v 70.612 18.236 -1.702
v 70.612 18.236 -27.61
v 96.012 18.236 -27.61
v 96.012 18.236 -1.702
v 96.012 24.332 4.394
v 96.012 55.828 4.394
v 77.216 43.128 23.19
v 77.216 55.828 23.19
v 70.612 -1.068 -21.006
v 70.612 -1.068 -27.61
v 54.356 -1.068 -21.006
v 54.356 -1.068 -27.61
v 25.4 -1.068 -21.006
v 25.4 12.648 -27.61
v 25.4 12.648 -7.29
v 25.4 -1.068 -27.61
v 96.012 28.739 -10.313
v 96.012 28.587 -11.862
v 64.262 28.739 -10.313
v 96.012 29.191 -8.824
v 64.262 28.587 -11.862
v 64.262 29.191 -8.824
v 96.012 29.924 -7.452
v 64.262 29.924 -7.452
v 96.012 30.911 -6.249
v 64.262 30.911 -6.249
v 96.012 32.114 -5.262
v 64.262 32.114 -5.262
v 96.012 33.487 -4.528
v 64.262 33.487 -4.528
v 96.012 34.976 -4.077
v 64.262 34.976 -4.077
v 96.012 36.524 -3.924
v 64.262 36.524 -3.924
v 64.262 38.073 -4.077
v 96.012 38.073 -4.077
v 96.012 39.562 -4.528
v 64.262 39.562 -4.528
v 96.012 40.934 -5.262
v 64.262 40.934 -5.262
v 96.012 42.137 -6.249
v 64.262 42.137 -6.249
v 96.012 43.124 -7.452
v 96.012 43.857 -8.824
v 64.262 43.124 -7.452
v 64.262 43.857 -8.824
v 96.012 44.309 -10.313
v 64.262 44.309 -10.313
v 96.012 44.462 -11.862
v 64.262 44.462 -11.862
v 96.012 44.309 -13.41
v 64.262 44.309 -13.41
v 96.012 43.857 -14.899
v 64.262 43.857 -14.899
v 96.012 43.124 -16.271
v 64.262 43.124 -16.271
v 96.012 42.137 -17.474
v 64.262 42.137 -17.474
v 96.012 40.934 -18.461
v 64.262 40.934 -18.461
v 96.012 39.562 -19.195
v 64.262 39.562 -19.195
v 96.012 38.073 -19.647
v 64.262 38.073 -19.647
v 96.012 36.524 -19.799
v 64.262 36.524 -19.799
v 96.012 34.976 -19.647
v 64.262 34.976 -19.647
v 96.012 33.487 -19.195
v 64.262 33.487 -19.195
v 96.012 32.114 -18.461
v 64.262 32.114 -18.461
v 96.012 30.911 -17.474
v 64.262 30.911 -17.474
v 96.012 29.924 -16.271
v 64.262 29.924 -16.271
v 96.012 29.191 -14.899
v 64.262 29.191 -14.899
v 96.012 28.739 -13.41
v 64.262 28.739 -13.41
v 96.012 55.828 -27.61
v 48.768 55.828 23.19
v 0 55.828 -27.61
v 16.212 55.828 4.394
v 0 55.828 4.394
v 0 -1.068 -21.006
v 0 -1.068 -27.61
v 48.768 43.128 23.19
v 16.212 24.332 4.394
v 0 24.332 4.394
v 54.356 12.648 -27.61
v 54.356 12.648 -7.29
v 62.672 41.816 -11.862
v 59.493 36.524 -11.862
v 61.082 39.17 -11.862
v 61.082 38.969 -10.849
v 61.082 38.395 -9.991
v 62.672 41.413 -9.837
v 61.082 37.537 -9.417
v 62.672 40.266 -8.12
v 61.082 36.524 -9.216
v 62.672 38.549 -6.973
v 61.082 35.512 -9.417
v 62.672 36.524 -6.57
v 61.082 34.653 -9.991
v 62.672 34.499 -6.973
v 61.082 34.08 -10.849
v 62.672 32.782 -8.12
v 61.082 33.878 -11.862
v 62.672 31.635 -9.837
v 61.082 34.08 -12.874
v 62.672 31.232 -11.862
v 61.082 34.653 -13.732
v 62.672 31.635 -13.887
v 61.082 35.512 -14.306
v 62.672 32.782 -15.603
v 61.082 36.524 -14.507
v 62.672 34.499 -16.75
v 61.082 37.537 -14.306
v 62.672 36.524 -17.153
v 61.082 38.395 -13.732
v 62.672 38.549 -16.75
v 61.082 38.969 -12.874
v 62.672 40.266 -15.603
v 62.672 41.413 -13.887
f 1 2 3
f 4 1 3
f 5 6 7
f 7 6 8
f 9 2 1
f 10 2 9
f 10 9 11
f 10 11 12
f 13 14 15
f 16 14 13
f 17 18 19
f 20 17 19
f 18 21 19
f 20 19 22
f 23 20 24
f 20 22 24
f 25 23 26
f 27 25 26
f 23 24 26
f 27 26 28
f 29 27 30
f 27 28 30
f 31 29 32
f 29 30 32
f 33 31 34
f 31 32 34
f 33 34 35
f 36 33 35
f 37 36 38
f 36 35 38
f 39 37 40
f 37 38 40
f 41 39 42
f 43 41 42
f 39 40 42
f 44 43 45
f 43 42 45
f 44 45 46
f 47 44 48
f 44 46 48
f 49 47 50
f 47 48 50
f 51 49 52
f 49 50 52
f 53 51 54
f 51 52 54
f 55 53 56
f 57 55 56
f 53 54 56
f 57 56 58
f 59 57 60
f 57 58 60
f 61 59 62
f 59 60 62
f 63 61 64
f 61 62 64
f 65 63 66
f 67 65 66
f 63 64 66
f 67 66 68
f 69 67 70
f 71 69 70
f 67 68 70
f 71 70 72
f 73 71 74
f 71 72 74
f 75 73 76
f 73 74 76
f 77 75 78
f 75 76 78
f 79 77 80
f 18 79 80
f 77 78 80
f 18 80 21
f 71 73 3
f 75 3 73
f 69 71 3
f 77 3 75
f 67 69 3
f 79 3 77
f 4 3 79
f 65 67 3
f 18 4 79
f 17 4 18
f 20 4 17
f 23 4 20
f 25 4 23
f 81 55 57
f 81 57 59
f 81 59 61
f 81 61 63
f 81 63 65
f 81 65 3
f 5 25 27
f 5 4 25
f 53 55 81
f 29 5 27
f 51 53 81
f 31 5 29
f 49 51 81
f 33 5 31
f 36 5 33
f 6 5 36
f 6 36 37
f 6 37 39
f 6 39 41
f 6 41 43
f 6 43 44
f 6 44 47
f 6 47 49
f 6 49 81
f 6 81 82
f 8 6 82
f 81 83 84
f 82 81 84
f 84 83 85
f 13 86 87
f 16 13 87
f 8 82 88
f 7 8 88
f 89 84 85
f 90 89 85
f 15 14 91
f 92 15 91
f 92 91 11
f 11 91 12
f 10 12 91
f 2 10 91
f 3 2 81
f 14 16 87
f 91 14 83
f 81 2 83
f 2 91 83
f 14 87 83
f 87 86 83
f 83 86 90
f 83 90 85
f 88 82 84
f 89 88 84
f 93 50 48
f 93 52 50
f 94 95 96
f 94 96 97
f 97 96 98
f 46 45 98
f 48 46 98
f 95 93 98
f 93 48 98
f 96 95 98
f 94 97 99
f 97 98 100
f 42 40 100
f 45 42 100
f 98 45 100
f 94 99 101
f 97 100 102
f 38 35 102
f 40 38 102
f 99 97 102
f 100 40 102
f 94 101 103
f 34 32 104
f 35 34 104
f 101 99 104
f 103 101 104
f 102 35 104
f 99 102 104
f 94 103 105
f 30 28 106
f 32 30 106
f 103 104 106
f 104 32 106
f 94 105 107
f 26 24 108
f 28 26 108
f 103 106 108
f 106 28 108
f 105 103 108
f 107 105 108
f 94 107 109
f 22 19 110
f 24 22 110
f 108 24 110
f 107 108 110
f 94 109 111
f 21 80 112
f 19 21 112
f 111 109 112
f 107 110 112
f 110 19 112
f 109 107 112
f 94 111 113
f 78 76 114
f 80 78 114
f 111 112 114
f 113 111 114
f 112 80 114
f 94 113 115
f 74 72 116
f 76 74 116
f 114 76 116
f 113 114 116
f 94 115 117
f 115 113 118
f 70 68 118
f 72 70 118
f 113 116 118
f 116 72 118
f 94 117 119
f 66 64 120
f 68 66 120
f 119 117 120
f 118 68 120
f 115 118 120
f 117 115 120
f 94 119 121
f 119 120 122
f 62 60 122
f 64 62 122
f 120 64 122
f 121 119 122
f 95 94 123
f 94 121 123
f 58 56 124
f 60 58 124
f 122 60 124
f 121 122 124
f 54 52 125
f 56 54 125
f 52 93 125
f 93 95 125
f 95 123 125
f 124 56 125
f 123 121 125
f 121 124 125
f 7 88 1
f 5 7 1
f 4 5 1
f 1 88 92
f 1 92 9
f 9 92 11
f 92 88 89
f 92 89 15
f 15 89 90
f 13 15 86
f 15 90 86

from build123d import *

# Parameters (mm, degrees)
F1_DEPTH = 96.012
F3_D     = 15.875
F3_DEPTH = 31.75
F3_TIP   = 4.7693311635
F5_DEPTH = 56.897
F6_W     = 28.956
F6_H     = 13.716
F6_W_2   = 25.4
F6_H_2   = 19.304
F7_DEPTH = 50.801
F9_DEPTH = 56.897


with BuildPart() as f1:
    # F0 (on Right) → F1 (new body)
    with BuildSketch(Plane.YZ):
        Polygon((55.828121284, -27.6095795721), (55.828121284, 23.1904204279), (43.128121284, 23.1904204279), (-1.067878716, -21.0055795721), (-1.067878716, -27.6095795721), align=None)
    extrude(amount=F1_DEPTH)

    # F3
    with Locations(Plane.YZ.offset(96.012)):
        with Locations((36.524121284, -11.8615795721)):
            Hole(F3_D / 2, depth=F3_DEPTH)
            with Locations((0, 0, -(F3_DEPTH + F3_TIP / 2))):  # 118° drill point
                Cone(0, F3_D / 2, F3_TIP, mode=Mode.SUBTRACT)

    # F4 (on face) → F5 (cut, through all)
    with BuildSketch(Plane(origin=(0, 55.828121284, 0), x_dir=(-1, 0, 0), z_dir=(0, 1, 0))):
        Polygon((-96.012, 4.3944204279), (-77.216, 23.1904204279), (-96.012, 23.1904204279), align=None)
    extrude(amount=-F5_DEPTH, mode=Mode.SUBTRACT)

    # F6 (on face) → F7 (cut, through all)
    with BuildSketch(Plane(origin=(0, 0, -27.6095795721), x_dir=(1, 0, 0), z_dir=(0, 0, -1))):
        with Locations((39.878, -5.790121284)):
            Rectangle(F6_W, F6_H)
        with Locations((83.312, -8.584121284)):
            Rectangle(F6_W_2, F6_H_2)
    extrude(amount=-F7_DEPTH, mode=Mode.SUBTRACT)

    # F8 (on face) → F9 (cut, through all)
    with BuildSketch(Plane(origin=(0, 55.828121284, 0), x_dir=(-1, 0, 0), z_dir=(0, 1, 0))):
        Polygon((-16.2123730209, 4.3944204279), (0, 4.3944204279), (0, 23.1904204279), (-48.768, 23.1904204279), align=None)
    extrude(amount=-F9_DEPTH, mode=Mode.SUBTRACT)


solid = f1.part
